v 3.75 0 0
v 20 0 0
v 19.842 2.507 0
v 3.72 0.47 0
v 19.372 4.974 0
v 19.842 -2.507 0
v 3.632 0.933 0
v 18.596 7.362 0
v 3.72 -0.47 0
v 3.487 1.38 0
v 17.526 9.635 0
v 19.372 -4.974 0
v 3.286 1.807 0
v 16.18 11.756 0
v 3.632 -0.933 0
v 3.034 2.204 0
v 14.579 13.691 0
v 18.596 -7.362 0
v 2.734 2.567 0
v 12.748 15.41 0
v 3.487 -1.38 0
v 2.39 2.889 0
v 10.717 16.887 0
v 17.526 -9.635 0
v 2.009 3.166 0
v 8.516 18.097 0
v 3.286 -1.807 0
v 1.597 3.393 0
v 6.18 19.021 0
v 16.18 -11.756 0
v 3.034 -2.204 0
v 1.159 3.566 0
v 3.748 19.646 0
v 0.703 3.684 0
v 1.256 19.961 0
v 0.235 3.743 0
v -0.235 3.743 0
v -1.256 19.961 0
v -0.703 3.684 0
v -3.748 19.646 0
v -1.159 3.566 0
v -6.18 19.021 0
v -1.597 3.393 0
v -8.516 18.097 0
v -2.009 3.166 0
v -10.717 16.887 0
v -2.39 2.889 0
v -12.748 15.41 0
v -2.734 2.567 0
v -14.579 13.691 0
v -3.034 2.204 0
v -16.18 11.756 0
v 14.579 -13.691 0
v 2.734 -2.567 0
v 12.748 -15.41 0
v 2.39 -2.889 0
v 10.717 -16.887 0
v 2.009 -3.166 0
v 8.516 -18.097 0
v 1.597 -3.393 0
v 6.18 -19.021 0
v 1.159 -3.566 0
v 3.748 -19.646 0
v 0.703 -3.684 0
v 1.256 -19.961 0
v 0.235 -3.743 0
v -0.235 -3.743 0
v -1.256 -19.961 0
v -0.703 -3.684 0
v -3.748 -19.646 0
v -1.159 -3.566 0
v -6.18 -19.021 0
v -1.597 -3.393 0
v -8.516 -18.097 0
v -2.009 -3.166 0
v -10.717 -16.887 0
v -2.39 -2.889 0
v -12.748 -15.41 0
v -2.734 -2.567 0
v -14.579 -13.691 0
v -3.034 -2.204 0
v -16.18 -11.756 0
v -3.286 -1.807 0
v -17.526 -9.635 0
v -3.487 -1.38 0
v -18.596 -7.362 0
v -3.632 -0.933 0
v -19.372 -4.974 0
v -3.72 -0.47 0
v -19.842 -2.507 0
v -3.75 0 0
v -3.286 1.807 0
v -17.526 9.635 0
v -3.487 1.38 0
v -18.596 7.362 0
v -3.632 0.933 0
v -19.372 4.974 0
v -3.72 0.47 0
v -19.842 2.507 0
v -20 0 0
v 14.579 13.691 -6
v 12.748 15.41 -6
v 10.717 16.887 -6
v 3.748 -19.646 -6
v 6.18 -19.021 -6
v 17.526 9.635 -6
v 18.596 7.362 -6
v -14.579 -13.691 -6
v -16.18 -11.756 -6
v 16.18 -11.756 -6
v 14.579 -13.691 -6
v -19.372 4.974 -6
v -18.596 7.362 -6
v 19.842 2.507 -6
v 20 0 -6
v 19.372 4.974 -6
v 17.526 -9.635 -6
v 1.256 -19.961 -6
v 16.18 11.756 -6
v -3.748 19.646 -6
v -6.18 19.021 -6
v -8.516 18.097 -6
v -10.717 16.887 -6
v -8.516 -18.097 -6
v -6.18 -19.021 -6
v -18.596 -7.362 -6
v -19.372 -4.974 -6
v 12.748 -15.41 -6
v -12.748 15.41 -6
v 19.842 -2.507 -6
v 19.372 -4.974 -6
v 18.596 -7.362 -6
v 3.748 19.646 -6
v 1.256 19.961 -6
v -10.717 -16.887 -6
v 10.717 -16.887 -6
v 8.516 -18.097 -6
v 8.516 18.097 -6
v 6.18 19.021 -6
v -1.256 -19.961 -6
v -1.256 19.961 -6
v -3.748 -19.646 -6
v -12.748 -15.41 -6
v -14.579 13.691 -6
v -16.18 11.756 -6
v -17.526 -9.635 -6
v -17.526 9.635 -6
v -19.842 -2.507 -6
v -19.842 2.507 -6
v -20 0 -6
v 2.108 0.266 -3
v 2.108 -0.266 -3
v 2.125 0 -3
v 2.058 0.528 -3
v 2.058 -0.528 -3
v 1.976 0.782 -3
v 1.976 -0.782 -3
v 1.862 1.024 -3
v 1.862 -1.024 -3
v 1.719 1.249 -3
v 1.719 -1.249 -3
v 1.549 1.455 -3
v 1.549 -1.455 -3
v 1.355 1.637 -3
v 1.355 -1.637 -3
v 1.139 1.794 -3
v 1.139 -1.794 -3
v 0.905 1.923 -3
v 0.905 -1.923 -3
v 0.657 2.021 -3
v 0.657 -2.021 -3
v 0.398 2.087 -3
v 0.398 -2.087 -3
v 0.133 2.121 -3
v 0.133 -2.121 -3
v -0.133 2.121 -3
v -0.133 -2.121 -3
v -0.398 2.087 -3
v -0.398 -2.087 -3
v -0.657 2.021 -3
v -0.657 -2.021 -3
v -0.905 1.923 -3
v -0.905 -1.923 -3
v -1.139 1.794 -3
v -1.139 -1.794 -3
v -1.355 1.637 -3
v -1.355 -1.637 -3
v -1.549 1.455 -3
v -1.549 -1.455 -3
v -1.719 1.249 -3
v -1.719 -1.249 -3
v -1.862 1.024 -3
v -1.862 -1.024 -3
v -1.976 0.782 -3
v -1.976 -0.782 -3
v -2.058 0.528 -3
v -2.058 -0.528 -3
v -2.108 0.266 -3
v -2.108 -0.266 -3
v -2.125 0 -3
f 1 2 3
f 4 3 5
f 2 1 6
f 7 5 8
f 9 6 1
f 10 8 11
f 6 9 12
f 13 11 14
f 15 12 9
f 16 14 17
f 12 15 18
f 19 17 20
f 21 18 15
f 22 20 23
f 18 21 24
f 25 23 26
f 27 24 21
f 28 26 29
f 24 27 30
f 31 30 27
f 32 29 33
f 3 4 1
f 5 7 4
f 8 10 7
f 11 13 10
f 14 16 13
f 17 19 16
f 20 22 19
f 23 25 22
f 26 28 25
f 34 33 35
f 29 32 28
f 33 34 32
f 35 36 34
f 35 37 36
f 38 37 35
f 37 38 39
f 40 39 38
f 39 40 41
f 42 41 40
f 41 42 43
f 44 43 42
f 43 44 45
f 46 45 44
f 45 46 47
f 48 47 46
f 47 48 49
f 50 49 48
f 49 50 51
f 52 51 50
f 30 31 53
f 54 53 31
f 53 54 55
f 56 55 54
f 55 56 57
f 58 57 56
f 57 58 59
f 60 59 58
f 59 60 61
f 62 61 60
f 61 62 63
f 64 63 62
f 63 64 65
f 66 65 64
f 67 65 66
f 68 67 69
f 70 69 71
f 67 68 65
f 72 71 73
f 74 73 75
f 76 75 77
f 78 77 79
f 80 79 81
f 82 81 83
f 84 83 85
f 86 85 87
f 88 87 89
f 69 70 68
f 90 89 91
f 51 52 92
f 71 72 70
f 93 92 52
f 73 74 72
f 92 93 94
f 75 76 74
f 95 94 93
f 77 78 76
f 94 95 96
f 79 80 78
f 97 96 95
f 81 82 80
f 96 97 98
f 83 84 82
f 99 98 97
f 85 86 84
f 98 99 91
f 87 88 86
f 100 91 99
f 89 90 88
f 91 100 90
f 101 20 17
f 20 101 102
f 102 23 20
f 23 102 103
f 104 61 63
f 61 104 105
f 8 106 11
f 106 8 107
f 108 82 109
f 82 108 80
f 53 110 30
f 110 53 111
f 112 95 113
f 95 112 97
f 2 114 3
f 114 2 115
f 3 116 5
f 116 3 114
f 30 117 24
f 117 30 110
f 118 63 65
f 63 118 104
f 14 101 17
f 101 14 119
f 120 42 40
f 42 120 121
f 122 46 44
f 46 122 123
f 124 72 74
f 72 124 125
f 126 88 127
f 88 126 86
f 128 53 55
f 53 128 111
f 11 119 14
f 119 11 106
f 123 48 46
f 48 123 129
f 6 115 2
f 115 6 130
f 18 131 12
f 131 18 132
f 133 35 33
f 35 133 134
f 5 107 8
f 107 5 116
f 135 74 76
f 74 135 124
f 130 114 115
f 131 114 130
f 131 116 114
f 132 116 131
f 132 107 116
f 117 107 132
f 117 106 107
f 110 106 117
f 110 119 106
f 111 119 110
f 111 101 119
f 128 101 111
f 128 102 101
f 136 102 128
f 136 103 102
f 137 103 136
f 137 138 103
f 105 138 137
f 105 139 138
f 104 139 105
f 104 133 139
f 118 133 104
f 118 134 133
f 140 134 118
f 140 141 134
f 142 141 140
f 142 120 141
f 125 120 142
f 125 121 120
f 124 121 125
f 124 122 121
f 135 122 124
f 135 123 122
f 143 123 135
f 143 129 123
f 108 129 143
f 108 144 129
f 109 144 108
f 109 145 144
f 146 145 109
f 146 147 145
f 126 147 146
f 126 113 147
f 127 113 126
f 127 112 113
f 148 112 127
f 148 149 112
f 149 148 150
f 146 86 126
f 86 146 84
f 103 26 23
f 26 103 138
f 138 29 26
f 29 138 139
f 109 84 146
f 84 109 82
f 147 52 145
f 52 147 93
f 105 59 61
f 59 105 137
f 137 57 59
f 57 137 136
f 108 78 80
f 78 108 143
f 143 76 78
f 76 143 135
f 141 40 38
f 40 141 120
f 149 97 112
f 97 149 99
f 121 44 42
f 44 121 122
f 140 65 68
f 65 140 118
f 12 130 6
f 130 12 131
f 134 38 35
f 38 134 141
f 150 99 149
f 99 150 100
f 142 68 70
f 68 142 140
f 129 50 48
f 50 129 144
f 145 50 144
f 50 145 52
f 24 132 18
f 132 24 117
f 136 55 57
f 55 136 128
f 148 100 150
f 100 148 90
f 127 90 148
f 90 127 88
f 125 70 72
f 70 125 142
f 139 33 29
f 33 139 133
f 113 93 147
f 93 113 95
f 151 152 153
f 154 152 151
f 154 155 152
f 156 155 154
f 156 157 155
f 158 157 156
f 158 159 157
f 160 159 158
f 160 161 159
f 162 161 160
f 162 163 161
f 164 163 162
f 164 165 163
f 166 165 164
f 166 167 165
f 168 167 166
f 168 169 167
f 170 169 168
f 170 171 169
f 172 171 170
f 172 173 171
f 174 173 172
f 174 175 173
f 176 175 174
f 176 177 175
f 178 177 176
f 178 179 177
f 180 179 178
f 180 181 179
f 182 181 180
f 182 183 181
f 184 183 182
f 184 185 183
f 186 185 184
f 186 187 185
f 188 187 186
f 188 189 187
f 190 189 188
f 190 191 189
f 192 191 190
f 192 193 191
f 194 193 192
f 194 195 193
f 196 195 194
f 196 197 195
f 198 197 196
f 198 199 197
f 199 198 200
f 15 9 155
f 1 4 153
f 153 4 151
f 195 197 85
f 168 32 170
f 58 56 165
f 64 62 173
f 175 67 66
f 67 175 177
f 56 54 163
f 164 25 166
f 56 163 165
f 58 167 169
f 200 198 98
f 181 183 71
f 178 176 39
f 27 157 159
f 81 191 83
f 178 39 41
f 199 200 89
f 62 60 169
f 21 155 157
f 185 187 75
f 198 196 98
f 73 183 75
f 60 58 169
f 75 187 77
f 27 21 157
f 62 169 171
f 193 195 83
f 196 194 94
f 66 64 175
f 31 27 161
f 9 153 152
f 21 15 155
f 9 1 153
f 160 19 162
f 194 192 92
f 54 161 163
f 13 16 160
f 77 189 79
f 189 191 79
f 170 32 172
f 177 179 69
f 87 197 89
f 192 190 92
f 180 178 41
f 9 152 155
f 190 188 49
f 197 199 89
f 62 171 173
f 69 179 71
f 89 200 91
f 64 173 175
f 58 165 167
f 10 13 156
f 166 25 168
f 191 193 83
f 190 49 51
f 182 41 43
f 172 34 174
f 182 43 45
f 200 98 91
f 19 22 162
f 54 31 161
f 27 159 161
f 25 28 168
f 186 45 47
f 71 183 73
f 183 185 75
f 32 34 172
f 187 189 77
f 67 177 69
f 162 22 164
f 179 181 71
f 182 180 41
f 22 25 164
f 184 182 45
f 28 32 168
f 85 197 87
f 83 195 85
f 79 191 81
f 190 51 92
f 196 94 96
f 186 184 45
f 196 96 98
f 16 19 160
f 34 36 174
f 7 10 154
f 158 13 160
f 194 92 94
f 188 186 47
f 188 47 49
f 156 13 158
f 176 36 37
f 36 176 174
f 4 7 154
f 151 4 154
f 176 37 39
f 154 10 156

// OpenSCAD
$fn = 50;


difference() {
	union() {
		translate(v = [0, 0, -3.0000000000]) {
			cylinder(h = 3, r = 10.0000000000);
		}
		translate(v = [0, 0, -6.0000000000]) {
			cylinder(h = 6, r = 20.0000000000);
		}
	}
	union() {
		translate(v = [0, 0, 0]) {
			rotate(a = [0, 0, 0]) {
				difference() {
					union() {
						#translate(v = [0, 0, -3.0000000000]) {
							cylinder(h = 3, r = 2.0000000000);
						}
						#translate(v = [0, 0, -3]) {
							cylinder(h = 3, r = 10.0000000000, r1 = 2.1250000000, r2 = 3.7500000000);
						}
						#translate(v = [0, 0, -3.0000000000]) {
							cylinder(h = 3, r = 2.1250000000);
						}
						#translate(v = [0, 0, -3.0000000000]) {
							cylinder(h = 3, r = 2.0000000000);
						}
					}
					union();
				}
			}
		}
	}
}
